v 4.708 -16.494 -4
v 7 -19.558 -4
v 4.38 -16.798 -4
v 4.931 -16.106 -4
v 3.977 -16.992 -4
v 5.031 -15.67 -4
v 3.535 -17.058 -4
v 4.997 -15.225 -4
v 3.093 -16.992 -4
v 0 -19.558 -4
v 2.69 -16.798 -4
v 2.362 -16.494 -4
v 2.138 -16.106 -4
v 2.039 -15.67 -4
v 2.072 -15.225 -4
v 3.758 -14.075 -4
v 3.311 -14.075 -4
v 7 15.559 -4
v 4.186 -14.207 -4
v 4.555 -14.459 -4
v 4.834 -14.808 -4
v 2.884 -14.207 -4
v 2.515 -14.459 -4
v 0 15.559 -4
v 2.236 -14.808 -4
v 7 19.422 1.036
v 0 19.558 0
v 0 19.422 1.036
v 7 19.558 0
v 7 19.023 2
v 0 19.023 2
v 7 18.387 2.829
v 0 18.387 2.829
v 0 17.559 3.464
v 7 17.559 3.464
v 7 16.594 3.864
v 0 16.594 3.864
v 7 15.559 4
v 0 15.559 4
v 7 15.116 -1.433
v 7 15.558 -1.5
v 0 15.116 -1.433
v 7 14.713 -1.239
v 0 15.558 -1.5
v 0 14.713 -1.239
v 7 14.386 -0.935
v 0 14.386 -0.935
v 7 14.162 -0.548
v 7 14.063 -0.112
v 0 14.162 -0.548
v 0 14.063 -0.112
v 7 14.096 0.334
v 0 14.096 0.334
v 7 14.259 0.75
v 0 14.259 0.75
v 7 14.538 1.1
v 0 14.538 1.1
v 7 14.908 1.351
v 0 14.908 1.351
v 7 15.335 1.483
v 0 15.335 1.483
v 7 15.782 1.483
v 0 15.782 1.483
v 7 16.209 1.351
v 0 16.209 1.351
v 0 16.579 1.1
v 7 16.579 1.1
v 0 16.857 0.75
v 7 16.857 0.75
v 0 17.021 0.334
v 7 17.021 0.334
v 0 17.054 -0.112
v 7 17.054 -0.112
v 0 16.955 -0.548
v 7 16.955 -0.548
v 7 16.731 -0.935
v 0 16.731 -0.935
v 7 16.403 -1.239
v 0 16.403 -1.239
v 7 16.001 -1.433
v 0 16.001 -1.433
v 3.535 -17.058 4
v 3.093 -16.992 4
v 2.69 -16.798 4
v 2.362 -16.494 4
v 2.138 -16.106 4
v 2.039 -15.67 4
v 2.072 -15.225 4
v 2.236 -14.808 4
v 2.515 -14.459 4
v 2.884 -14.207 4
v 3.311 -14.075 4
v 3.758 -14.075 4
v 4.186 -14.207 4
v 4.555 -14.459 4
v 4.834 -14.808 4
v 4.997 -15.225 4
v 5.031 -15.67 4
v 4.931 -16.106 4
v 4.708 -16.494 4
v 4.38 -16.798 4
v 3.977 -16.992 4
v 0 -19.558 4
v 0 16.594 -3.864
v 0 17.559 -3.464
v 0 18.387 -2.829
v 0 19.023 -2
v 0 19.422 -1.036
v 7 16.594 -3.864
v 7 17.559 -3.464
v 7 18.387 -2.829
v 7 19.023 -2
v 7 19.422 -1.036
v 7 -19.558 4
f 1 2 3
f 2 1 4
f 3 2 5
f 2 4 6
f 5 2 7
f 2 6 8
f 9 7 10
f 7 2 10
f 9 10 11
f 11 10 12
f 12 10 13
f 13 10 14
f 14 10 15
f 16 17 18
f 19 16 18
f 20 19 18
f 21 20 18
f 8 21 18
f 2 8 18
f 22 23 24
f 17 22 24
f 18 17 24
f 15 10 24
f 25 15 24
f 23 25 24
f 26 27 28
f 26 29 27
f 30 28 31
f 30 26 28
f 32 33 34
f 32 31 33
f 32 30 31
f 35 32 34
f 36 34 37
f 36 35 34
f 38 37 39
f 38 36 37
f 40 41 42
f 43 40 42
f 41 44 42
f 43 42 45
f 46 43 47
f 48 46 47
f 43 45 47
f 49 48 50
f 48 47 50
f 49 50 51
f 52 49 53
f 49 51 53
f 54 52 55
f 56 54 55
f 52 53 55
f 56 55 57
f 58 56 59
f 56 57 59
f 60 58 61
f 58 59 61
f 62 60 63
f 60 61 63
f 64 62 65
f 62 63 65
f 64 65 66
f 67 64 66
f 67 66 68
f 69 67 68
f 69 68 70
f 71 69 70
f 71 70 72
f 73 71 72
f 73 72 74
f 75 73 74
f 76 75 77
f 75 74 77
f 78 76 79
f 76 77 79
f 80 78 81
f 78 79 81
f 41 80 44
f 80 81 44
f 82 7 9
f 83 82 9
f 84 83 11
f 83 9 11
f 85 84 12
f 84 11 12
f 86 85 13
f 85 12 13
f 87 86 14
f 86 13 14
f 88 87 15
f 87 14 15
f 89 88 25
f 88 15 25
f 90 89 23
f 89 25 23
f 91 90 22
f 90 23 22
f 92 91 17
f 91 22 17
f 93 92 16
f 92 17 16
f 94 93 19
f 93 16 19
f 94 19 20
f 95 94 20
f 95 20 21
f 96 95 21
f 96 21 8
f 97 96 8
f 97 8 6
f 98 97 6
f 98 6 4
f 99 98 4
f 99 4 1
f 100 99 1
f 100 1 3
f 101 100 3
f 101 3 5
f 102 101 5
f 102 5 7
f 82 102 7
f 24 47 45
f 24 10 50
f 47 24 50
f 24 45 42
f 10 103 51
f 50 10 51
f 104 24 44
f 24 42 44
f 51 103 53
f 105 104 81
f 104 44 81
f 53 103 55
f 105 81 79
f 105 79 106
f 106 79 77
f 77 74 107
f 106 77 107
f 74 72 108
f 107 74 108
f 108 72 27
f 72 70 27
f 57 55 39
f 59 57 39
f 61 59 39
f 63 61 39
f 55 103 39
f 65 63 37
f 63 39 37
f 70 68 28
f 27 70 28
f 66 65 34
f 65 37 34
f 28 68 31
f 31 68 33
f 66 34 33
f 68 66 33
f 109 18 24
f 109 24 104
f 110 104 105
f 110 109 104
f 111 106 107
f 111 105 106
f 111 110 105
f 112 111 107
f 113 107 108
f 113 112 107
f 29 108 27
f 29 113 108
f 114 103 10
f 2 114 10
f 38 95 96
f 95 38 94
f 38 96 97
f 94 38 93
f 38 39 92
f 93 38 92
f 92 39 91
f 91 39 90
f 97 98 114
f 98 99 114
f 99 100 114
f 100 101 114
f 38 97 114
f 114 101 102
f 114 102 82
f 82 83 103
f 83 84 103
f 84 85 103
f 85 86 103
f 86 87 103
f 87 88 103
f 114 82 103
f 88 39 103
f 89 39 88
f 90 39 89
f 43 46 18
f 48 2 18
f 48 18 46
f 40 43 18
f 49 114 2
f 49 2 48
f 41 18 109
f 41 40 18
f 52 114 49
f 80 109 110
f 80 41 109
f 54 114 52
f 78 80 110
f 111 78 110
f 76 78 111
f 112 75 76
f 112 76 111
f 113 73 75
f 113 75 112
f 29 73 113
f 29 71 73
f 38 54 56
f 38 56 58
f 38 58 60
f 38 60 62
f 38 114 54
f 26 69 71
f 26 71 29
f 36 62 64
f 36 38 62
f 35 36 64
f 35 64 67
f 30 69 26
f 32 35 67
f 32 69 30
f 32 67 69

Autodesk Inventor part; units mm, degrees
ref_plane "YZ Plane" through (0, 0, 0) normal (1, 0, 0) x (0, 1, 0)
ref_plane "XZ Plane" through (0, 0, 0) normal (0, 1, 0) x (-1, 0, 0)
ref_plane "XY Plane" through (0, 0, 0) normal (0, 0, 1) x (1, 0, 0)
sketch "Sketch1" plane through (0, 0, 0) normal (1, 0, 0) x (0, 1, 0)
  line L0 (-19.5584, -4) -> (19.5584, -4)
  line L1 (19.5584, -4) -> (19.5584, 4)
  line L2 (19.5584, 4) -> (-19.5584, 4)
  line L3 (-19.5584, 4) -> (-19.5584, -4)
  line L4 (-19.5584, -4) -> (19.5584, 4) construction
  line L5 (19.5584, -4) -> (-19.5584, 4) construction
  point P0 (0, 0)
  dimension "d0" = 8
extrude "Extrusion1" add sketch "Sketch1" along normal blind 7
sketch "Sketch2" plane through (7, 0, 0) normal (1, 0, 0) x (0, 0, -1)
  arc A0 (4, 15.5584) -> (-4, 15.5584) centre (0, 15.5584) ccw projected
  point P0 (0, 0)
fillet "Fillet2" radius 4 2 edges at (3.5, 19.5584, -4) (3.5, 19.5584, 4)
hole "Hole1" at (7, 15.5584, 0) direction (-1, 0, 0) diameter 3 end through all
sketch "Sketch3" plane through (0, -19.5584, 4) normal (0, 0, 1) x (1, 0, 0)
  line L0 (0, 0) -> (7, 0) projected
  point P0 (0, 19.5584)
  point P1 (3.5348, 4)
  dimension "d12" = 4
hole "Hole2" at (3.5348, -15.5584, 4) direction (0, 0, -1) diameter 3 end through all
properties part number "Puller"
